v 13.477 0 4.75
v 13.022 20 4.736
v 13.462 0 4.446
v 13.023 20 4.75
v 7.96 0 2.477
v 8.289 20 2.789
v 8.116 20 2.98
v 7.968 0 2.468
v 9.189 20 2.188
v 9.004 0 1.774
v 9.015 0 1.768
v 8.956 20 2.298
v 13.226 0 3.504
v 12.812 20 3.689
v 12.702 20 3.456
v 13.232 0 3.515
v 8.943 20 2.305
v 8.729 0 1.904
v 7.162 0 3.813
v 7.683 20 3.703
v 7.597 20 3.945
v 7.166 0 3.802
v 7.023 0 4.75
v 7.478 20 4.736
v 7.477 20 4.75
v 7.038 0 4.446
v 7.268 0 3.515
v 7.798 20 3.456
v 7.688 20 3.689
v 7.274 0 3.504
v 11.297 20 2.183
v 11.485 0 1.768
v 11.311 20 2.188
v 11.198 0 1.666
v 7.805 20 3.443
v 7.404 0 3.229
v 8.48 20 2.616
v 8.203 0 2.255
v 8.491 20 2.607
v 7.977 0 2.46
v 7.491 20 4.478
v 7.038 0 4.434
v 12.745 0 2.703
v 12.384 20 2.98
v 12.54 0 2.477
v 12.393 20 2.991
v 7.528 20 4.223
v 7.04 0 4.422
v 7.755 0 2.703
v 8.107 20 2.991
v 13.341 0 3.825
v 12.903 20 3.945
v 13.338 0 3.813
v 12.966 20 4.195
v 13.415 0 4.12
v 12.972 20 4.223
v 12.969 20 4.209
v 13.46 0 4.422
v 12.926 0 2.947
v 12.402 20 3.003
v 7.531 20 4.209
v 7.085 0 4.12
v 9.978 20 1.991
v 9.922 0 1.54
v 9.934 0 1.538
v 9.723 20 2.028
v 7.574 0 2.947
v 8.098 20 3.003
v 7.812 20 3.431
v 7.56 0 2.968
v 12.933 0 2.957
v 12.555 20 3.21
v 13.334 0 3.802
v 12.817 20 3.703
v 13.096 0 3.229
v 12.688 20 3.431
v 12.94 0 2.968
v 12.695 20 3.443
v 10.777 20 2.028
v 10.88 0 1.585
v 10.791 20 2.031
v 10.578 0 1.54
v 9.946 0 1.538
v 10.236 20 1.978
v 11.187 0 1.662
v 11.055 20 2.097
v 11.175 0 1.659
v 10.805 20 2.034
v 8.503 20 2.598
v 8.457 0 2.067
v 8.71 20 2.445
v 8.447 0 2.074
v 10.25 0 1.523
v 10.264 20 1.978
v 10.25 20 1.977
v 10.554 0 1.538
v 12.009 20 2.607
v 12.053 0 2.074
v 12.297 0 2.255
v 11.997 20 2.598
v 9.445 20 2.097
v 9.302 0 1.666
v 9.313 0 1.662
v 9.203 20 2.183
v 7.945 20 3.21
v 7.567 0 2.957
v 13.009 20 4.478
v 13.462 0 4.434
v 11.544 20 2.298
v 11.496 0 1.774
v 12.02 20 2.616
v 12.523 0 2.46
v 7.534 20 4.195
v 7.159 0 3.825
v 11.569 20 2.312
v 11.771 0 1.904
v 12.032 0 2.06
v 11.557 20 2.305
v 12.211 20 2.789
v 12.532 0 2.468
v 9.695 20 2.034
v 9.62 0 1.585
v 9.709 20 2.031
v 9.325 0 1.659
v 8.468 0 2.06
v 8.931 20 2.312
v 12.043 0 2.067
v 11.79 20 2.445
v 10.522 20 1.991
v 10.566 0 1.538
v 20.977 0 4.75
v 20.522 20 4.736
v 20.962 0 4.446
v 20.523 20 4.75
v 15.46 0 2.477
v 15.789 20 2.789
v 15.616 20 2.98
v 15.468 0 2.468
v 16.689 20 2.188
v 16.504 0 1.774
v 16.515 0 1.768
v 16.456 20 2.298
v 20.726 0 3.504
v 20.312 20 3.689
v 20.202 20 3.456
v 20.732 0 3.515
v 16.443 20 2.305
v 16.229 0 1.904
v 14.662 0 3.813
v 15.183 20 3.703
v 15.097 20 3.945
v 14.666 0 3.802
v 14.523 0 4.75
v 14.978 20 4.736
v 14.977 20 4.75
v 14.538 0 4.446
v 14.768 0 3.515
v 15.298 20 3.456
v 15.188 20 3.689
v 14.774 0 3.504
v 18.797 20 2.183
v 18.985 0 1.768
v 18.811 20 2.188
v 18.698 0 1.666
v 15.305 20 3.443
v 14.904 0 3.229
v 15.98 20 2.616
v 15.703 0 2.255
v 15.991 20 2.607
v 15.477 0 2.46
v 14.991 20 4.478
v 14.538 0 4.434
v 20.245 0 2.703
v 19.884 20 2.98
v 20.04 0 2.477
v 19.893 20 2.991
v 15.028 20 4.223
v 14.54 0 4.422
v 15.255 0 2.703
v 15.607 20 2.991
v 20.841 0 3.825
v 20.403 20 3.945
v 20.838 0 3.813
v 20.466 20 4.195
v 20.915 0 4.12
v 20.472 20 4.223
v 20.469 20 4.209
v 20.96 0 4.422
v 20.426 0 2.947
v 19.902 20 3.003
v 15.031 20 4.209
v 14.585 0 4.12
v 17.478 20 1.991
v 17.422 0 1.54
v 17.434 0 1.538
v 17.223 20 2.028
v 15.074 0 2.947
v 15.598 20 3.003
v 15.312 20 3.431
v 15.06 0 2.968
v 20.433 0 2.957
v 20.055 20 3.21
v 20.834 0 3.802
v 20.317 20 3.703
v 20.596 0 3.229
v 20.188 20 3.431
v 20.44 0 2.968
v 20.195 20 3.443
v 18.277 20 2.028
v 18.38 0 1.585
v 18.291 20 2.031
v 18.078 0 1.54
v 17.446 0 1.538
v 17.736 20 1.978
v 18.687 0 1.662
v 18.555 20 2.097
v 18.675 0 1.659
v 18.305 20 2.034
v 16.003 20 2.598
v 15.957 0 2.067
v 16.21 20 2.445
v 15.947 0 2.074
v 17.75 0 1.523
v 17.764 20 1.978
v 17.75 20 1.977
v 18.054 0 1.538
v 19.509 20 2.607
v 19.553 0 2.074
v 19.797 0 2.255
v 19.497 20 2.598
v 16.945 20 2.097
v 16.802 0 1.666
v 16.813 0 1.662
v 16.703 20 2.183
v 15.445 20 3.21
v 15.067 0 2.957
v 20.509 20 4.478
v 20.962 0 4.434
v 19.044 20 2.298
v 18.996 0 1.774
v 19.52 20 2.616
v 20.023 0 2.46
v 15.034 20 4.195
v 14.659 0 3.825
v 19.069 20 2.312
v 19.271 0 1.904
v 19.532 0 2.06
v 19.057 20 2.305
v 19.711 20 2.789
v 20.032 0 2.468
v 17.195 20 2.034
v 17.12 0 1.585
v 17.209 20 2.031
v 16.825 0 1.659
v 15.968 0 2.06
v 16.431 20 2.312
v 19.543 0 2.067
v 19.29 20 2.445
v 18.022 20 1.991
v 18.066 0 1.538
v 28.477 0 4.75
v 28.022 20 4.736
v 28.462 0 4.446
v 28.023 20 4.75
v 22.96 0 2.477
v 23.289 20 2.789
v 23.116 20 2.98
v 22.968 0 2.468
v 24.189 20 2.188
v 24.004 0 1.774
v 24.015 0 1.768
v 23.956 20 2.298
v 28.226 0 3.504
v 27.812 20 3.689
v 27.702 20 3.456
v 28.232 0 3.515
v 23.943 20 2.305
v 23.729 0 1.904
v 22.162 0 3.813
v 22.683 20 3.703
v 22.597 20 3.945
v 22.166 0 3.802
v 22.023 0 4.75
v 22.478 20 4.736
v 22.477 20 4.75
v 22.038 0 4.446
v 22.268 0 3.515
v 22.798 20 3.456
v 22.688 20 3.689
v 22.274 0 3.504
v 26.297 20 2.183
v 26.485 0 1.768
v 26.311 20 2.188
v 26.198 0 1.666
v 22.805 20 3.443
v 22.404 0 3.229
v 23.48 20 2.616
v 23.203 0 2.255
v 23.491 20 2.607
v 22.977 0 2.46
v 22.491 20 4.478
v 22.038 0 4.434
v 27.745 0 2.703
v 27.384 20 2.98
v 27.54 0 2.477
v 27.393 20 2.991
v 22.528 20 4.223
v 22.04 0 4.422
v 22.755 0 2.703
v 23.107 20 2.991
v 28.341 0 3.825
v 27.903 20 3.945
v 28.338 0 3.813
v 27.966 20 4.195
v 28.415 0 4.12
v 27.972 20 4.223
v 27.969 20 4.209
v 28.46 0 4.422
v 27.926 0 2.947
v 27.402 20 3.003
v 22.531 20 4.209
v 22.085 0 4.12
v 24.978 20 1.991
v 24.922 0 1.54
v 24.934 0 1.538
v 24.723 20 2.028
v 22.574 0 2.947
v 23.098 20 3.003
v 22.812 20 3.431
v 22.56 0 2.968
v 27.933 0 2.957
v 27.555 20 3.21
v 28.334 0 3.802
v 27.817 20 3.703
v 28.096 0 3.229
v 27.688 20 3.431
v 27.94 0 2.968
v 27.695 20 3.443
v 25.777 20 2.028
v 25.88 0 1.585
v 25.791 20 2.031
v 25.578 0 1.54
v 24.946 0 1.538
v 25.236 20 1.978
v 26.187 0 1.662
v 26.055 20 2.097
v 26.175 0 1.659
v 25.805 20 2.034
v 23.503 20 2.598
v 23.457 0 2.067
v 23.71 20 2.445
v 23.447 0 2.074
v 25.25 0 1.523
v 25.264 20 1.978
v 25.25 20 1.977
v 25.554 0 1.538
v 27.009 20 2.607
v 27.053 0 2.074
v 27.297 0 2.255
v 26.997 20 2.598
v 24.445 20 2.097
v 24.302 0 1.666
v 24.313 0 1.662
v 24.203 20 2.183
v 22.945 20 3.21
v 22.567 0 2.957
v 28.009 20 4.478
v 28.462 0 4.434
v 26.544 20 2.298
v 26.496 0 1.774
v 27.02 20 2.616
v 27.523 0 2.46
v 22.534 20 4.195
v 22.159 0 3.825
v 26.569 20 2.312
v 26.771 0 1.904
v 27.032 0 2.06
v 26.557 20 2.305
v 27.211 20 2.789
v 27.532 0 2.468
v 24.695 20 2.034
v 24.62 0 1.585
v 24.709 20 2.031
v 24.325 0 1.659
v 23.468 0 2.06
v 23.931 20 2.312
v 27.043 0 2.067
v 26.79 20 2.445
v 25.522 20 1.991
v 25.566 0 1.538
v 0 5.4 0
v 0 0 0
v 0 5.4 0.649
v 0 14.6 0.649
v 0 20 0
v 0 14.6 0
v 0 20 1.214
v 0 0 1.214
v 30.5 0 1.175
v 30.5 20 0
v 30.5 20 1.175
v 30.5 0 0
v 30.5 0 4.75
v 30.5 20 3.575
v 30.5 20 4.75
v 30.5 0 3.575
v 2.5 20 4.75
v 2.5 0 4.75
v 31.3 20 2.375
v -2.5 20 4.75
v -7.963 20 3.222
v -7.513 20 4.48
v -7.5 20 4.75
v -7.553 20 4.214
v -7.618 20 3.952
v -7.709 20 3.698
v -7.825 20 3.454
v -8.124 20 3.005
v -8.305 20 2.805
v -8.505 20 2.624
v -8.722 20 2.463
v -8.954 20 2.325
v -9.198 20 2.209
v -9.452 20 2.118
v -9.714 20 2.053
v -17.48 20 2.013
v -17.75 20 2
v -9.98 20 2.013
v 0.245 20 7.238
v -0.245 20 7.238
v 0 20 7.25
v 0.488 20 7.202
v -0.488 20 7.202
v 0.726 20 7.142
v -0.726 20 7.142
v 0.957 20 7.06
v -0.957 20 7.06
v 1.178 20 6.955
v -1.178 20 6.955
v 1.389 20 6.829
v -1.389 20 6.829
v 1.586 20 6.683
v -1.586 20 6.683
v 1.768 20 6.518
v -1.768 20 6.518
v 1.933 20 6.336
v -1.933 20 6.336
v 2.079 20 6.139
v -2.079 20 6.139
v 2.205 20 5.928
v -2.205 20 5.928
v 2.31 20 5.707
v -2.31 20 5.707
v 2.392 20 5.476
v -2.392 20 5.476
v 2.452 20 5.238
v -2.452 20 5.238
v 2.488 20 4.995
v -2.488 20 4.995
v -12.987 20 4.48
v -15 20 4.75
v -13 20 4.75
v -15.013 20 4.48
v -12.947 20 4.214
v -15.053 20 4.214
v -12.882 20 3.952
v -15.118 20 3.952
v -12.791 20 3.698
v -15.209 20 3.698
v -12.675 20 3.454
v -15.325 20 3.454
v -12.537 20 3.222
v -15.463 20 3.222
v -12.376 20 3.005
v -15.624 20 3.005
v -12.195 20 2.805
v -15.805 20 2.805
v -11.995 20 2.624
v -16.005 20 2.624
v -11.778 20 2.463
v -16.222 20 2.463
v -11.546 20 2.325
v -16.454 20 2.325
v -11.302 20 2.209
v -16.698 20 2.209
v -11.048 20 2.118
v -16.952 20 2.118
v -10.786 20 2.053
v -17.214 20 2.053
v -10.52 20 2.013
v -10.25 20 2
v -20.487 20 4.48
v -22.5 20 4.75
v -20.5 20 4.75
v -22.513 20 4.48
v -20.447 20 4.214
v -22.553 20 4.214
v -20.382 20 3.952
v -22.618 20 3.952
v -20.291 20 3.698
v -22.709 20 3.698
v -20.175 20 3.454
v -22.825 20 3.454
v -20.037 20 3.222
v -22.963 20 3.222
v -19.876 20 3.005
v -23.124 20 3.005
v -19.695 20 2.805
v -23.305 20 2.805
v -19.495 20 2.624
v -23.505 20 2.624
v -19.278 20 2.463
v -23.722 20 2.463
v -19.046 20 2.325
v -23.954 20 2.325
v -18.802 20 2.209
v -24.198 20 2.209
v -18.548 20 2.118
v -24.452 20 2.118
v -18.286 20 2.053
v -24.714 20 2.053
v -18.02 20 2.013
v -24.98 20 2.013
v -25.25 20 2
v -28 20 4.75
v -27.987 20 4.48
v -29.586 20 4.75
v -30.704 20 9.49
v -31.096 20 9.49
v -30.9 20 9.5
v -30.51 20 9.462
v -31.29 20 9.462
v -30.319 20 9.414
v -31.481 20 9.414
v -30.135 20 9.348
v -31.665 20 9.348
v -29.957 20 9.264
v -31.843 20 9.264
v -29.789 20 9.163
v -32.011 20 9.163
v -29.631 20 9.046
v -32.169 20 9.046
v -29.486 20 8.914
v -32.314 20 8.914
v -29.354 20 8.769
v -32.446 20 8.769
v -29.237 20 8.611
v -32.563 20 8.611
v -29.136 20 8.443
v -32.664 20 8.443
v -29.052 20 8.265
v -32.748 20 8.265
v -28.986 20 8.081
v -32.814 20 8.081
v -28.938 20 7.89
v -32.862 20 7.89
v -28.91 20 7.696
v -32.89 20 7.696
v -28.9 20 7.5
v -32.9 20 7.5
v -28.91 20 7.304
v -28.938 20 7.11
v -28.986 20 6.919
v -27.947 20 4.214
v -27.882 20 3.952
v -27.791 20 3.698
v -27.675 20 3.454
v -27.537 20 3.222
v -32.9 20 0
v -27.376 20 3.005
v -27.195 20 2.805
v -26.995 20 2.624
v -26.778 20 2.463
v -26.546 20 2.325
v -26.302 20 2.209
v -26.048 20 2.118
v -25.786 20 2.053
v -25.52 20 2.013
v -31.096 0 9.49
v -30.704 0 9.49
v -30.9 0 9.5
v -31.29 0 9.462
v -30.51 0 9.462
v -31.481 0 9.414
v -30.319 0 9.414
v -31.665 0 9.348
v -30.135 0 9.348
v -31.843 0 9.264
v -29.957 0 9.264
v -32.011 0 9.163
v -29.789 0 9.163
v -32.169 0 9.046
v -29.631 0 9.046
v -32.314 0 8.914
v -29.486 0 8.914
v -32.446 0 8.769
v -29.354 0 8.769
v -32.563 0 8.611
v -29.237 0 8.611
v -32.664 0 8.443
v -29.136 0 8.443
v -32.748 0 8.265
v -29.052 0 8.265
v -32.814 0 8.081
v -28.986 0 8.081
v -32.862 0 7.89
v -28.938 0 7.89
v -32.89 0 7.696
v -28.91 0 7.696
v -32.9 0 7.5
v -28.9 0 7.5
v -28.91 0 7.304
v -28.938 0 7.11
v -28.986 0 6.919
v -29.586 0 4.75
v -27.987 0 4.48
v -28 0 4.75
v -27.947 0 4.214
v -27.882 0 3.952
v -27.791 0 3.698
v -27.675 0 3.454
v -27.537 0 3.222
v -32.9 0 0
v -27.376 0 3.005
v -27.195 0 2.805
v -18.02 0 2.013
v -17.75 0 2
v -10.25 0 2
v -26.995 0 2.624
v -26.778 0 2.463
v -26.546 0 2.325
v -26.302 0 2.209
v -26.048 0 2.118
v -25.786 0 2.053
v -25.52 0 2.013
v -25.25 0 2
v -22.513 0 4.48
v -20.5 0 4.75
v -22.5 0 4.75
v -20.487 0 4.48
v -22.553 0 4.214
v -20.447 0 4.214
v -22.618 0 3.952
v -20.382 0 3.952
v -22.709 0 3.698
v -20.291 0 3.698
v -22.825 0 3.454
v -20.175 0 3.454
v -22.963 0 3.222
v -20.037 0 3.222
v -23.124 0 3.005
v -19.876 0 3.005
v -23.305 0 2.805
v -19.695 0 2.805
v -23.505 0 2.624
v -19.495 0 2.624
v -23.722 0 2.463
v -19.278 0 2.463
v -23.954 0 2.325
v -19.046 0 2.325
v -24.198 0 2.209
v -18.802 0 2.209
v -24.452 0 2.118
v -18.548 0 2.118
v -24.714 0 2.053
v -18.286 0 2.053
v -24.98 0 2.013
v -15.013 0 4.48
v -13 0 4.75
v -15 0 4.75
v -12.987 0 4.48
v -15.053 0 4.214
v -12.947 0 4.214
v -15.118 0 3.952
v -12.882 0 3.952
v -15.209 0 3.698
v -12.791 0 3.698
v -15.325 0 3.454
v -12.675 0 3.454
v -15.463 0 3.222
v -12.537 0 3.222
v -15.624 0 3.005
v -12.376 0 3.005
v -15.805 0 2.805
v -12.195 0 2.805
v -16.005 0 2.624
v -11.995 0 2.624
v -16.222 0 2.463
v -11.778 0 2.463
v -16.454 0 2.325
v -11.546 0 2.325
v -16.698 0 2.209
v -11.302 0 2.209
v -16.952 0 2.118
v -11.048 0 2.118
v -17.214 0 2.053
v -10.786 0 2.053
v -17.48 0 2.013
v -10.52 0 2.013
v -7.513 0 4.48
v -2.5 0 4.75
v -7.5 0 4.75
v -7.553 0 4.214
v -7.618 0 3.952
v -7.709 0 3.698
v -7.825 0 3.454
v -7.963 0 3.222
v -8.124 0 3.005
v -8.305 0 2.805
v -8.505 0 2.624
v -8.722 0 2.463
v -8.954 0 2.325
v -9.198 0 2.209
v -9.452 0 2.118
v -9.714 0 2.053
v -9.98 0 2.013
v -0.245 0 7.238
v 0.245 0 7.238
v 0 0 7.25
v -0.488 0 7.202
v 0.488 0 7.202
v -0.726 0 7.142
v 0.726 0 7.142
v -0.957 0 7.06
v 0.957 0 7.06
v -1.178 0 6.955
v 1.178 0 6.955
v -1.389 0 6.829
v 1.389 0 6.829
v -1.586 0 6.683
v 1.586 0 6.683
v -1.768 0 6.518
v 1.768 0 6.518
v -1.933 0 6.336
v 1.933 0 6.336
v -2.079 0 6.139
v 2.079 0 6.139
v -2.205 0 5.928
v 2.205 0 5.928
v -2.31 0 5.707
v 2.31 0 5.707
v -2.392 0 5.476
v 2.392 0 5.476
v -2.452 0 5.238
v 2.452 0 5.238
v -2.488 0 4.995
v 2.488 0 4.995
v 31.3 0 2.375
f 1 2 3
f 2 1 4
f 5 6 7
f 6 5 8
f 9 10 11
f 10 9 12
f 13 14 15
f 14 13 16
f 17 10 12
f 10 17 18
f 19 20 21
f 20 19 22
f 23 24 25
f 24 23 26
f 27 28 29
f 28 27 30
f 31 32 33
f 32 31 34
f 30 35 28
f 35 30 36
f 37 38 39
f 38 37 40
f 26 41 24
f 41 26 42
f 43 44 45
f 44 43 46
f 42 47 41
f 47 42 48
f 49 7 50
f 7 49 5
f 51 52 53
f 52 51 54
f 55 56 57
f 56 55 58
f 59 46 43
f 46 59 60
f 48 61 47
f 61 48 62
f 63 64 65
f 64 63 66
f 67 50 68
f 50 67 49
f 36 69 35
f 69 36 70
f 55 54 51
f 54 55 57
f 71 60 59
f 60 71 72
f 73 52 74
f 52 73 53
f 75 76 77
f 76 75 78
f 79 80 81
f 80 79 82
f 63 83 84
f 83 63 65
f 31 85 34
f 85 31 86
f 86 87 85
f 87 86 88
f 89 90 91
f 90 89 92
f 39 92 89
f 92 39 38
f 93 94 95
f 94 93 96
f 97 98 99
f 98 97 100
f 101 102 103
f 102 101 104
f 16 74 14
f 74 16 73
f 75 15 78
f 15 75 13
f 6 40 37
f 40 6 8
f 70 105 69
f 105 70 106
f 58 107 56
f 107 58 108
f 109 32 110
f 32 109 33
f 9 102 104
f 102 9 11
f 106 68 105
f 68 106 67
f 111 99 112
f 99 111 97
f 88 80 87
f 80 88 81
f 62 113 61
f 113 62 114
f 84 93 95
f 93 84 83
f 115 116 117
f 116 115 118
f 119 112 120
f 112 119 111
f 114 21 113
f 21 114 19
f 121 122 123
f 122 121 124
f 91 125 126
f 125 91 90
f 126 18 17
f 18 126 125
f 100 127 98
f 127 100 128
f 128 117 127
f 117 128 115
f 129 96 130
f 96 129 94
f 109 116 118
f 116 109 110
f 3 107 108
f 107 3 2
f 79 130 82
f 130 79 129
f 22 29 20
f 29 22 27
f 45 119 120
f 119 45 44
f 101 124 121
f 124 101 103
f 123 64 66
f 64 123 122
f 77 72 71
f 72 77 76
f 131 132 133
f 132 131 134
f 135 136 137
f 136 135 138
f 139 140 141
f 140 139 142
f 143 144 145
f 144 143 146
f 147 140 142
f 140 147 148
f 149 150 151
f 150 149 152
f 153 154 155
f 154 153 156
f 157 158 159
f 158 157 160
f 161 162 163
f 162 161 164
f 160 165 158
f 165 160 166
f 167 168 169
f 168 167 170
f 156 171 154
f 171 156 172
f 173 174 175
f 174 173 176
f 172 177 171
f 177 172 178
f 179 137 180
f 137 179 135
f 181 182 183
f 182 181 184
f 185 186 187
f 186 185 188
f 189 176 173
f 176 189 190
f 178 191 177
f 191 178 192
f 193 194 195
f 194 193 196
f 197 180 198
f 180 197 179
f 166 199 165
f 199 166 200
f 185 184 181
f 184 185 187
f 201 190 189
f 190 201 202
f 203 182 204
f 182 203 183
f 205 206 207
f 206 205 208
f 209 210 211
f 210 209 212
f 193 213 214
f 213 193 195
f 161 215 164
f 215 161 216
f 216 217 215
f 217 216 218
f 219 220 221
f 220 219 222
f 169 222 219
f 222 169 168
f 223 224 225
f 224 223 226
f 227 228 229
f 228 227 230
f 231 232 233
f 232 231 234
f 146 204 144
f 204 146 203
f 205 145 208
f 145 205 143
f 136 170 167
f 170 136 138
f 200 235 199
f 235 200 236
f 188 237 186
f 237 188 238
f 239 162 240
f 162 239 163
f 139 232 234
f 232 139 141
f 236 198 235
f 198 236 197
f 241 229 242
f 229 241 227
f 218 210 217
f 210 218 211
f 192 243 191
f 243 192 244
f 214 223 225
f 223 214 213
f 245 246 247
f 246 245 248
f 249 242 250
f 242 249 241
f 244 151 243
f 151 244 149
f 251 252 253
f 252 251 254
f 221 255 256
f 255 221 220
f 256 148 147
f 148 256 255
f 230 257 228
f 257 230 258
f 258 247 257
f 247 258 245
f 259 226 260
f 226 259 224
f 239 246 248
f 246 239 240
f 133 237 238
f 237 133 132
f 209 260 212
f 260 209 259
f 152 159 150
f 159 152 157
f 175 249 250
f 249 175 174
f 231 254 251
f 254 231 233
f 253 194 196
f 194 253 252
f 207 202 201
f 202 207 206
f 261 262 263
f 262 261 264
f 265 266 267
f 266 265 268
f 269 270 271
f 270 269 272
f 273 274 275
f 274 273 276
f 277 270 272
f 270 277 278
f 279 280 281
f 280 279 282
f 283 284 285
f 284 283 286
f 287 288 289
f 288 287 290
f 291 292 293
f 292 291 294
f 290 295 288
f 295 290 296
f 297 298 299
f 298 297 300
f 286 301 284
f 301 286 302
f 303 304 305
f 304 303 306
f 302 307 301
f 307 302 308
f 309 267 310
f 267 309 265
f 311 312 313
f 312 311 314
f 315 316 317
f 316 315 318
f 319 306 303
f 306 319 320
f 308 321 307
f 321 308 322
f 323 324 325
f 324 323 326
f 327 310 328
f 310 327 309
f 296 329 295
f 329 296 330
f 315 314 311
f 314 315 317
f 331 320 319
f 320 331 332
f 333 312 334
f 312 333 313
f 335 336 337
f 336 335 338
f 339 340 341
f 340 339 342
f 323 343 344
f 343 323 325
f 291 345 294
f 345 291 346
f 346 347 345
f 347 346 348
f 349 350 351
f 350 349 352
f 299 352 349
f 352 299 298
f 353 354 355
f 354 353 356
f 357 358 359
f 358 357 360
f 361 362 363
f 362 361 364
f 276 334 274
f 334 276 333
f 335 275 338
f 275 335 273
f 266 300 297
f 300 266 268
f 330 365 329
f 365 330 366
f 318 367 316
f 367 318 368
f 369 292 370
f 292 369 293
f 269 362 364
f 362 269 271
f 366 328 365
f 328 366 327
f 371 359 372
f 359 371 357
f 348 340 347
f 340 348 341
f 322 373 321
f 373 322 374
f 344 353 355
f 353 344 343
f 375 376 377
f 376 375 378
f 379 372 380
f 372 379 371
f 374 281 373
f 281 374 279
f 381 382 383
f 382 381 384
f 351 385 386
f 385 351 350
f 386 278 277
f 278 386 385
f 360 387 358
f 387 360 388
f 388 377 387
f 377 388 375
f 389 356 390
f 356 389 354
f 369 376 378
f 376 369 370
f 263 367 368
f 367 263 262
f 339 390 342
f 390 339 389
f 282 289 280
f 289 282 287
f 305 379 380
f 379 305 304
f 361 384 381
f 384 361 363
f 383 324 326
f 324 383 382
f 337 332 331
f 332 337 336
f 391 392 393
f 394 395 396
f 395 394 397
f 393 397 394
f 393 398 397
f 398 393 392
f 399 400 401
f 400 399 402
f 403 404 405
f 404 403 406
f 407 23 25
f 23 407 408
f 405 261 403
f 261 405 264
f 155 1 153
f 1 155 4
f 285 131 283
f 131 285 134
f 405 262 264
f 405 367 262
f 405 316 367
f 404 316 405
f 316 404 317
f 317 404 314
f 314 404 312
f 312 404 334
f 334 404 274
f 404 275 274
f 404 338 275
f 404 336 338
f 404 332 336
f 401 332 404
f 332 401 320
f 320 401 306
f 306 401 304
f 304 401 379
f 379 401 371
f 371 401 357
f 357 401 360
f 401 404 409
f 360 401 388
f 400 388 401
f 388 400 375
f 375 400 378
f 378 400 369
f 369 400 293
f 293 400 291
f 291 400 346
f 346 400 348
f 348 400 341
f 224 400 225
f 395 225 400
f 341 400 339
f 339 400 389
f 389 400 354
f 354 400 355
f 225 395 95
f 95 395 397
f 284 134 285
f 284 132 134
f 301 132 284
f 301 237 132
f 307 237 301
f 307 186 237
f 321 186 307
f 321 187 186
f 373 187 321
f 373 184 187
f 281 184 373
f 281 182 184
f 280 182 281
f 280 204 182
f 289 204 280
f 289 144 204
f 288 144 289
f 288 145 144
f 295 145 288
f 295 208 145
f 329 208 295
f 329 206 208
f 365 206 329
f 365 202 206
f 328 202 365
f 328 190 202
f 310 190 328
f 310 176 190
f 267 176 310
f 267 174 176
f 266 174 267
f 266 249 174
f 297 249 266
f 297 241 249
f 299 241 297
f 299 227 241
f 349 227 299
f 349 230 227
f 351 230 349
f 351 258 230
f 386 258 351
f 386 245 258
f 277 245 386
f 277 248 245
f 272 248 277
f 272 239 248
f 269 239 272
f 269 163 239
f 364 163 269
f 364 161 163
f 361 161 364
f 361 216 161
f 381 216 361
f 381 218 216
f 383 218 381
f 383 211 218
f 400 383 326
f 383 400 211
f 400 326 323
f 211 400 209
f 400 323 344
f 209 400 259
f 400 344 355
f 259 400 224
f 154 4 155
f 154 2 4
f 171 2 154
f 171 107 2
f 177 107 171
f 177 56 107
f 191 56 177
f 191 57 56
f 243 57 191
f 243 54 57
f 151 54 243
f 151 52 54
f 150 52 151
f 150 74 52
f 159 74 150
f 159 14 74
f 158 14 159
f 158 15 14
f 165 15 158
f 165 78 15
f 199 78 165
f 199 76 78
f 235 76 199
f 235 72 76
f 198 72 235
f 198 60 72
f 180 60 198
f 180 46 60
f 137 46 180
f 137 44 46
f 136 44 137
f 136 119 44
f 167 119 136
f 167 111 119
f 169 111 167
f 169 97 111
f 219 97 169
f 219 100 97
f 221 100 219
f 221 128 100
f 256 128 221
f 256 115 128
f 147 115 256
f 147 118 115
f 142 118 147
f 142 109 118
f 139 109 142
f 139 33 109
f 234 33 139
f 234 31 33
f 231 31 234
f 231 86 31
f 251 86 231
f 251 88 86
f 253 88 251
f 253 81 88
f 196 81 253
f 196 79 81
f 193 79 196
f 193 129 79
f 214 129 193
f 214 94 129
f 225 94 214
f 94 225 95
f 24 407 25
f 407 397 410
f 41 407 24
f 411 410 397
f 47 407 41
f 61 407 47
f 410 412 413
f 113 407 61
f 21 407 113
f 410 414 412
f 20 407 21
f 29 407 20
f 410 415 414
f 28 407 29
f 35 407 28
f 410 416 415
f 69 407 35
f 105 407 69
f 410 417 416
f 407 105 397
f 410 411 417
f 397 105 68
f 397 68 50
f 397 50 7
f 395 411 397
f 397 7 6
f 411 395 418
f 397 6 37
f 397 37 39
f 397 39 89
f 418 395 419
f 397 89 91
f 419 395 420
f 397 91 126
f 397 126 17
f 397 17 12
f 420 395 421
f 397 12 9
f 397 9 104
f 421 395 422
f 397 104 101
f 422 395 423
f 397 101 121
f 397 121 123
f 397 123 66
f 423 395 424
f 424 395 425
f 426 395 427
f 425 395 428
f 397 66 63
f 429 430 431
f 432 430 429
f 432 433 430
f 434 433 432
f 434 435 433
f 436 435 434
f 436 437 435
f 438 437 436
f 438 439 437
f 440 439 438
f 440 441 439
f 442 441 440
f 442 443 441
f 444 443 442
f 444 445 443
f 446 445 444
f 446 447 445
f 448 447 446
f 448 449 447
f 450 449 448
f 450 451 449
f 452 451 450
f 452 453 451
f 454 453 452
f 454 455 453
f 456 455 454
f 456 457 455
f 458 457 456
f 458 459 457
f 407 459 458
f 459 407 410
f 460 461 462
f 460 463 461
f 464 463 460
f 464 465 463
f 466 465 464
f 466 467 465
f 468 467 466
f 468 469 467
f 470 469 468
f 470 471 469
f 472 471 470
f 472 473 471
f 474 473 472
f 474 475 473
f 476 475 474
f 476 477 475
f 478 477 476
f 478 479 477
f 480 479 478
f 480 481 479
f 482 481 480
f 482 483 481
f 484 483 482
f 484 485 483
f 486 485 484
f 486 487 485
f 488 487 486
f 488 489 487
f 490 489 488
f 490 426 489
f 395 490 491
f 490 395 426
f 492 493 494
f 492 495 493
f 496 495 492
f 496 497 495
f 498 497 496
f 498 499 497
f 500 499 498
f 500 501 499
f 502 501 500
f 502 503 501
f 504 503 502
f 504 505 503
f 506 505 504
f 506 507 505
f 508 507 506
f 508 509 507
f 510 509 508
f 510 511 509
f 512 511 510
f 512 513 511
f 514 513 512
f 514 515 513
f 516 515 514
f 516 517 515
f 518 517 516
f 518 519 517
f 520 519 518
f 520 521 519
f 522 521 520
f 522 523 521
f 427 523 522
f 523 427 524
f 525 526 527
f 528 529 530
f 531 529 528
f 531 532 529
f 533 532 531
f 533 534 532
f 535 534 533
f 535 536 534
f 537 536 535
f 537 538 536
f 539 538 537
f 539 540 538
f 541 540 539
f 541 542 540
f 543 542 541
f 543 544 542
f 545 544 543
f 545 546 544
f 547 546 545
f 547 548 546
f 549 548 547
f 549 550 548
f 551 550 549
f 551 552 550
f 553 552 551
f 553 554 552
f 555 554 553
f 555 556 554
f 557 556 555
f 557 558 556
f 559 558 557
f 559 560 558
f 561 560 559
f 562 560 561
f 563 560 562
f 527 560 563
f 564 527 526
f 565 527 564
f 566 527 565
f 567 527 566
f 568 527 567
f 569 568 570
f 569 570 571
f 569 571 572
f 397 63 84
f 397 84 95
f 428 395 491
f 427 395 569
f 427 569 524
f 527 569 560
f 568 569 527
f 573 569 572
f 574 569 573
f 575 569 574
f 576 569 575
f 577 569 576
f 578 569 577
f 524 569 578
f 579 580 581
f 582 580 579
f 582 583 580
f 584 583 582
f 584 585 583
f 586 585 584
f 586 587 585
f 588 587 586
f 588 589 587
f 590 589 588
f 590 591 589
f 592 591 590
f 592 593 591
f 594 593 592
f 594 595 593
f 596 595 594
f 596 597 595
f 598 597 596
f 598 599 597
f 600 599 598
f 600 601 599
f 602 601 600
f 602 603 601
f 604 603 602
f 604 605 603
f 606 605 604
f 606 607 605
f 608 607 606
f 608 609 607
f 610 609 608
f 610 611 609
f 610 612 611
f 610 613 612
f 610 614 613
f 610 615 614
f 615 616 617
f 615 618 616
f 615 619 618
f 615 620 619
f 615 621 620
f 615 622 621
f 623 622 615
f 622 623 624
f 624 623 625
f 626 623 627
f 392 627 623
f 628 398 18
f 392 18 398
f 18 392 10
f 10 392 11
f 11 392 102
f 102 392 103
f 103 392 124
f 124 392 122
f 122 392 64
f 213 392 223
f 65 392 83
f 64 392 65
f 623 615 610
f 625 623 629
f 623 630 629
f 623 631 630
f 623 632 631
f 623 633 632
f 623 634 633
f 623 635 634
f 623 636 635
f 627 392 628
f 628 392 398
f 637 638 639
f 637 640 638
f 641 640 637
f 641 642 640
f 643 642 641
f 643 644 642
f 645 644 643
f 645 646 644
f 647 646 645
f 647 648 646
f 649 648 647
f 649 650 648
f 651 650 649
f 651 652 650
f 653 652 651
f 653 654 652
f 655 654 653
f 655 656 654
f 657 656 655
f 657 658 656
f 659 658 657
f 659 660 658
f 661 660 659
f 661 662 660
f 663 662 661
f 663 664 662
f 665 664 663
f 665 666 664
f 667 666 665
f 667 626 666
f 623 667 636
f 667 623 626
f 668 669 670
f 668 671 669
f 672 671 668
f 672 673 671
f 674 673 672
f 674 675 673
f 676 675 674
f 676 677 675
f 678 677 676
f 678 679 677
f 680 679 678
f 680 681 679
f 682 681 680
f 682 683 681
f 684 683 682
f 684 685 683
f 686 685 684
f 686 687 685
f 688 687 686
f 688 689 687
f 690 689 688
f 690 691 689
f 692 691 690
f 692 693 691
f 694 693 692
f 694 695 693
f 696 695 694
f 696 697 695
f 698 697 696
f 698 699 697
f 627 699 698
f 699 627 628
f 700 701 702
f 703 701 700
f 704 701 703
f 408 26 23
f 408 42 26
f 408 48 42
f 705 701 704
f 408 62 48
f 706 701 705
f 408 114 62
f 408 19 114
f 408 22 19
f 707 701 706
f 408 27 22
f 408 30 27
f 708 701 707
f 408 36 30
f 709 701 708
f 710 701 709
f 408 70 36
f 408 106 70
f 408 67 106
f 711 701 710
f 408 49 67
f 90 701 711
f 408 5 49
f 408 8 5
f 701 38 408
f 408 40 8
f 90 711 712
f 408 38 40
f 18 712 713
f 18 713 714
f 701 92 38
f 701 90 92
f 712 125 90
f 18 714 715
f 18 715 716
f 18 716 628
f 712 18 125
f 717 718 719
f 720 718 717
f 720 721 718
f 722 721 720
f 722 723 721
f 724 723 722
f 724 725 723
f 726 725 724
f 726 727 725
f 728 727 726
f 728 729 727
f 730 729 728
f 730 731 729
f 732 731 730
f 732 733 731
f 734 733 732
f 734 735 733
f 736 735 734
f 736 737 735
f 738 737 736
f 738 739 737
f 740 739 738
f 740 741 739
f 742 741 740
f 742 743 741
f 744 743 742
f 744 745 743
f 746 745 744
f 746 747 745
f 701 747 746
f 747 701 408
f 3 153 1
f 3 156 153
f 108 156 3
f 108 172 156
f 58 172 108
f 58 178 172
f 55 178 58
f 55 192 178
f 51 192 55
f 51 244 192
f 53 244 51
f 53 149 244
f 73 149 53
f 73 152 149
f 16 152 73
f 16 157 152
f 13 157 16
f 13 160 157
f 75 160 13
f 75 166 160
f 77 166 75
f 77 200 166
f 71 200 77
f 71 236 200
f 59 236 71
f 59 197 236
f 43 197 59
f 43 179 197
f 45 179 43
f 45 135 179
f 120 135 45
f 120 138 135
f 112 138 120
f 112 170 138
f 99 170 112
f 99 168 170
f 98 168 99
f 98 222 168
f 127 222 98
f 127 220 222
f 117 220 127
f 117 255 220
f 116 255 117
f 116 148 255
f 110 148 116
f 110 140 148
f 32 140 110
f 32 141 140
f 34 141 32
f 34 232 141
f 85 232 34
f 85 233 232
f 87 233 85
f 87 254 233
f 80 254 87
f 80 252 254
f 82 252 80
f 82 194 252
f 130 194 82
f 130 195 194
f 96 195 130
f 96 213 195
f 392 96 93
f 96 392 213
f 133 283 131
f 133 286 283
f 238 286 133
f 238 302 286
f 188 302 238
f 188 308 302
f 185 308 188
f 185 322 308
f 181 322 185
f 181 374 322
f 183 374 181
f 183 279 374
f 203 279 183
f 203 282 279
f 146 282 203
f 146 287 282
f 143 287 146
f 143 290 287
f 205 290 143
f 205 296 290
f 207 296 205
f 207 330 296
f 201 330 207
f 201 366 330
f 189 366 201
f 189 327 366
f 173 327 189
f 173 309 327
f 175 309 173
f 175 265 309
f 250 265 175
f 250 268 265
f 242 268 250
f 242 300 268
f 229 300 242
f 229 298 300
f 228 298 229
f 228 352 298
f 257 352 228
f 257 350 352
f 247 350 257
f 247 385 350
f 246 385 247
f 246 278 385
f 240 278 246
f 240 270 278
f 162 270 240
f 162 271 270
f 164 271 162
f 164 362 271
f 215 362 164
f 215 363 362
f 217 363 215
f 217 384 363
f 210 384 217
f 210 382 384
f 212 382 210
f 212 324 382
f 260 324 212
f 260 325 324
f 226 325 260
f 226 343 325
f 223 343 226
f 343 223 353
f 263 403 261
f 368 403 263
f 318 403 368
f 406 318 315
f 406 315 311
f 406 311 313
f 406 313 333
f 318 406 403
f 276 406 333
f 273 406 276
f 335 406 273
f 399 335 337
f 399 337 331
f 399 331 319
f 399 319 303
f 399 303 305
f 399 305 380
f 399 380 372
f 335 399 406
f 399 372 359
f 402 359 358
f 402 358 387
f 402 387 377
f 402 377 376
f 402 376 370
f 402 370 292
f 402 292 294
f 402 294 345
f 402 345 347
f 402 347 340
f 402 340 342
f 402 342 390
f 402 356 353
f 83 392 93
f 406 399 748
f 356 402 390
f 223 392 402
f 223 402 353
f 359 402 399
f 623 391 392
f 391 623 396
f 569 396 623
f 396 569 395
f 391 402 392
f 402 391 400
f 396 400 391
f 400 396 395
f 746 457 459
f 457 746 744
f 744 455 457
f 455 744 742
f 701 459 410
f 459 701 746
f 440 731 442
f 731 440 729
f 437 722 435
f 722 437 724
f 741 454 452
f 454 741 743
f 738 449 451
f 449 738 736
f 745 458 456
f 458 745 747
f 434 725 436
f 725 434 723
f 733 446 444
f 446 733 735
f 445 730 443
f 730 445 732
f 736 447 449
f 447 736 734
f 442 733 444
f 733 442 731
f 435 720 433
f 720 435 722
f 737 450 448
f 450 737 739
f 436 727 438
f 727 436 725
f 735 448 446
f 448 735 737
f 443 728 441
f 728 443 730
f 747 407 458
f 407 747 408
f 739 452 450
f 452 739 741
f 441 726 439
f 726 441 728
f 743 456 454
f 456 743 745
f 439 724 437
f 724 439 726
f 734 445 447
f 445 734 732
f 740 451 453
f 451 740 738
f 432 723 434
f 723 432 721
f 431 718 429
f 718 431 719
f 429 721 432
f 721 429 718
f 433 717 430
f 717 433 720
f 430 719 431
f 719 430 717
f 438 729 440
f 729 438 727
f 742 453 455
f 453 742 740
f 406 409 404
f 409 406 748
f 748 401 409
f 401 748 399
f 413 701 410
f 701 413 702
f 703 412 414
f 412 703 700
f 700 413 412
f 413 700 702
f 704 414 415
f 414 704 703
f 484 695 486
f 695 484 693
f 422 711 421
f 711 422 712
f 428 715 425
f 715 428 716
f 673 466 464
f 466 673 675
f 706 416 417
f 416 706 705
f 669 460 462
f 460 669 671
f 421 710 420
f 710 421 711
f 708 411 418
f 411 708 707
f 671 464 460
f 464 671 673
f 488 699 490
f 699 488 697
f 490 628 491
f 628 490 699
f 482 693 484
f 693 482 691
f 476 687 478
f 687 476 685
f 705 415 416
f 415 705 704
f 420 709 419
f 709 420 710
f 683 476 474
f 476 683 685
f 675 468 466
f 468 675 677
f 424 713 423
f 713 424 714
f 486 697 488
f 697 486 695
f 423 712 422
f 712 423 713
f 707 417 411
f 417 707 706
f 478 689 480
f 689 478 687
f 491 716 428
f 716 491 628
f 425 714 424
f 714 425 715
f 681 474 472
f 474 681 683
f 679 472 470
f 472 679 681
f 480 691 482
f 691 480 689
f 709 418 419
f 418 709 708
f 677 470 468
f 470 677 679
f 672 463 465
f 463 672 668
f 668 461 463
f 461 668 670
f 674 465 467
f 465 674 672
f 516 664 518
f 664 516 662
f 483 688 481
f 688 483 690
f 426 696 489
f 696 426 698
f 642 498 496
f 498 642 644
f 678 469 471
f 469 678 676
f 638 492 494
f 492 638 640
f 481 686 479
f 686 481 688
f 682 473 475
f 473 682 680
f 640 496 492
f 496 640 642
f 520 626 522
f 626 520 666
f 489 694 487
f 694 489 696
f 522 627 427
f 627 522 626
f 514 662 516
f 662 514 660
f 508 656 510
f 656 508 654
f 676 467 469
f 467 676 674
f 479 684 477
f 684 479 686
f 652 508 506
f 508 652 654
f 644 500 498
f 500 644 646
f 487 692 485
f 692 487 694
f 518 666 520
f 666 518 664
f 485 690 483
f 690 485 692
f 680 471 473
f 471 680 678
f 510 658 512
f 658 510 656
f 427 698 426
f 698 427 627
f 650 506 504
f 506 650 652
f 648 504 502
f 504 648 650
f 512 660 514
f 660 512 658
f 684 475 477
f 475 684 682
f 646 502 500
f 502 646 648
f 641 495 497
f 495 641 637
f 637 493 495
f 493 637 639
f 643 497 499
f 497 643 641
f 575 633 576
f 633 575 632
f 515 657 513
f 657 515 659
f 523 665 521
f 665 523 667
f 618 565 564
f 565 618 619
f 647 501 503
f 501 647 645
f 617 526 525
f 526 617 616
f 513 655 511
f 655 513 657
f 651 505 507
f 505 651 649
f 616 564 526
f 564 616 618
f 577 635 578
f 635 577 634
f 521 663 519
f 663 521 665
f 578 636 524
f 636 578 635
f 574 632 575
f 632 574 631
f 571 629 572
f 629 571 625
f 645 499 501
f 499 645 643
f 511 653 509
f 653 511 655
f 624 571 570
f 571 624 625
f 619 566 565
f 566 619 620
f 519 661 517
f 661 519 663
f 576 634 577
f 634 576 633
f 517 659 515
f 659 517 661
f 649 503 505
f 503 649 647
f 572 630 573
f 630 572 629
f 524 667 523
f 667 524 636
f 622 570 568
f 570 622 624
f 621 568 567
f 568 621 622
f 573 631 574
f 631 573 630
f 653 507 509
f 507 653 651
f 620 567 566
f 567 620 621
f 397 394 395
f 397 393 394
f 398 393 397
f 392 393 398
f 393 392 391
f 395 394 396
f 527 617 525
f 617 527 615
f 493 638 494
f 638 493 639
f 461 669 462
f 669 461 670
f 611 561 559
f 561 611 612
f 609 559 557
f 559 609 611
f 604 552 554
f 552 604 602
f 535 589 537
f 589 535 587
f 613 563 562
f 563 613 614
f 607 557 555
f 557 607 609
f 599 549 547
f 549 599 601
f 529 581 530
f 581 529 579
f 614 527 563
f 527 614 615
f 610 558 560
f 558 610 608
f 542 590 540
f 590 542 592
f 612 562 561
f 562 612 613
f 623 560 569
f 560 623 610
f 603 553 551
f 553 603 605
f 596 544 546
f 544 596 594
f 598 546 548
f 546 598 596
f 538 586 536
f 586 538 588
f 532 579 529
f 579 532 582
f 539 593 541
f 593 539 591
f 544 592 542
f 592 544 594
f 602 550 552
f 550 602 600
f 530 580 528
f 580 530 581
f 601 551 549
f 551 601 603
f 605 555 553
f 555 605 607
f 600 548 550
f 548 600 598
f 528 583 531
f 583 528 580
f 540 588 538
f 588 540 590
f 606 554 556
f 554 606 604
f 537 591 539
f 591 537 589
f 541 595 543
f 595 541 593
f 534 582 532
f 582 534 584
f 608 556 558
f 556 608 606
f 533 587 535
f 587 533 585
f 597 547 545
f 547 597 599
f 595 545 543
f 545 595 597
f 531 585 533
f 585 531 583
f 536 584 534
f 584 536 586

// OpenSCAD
// ============================================================
//   CLIP FERMA CAVO PRINT-IN-PLACE
//   Design parametrico con cerniera e chiusura a scatto
// ============================================================

/* [Clip Ferma Cavo] */
// Numero di cavi da gestire
num_cables = 3; // [1:1:10]
// Diametro dei cavi in mm (5.5 è ottimo per USB-C)
cable_dia = 5.5; // [3:0.1:15]
// Lunghezza della clip lungo il cavo
clip_length = 20; // [10:1:50]

/* [Tolleranze e Stampa] */
// Tolleranza per la cerniera print-in-place (0.4 consigliata per PLA)
pip_clearance = 0.4; // [0.1:0.1:0.8]
// Durezza dello scatto (maggiore = più forte ma richiede più flessione)
snap_depth = 0.8; // [0.4:0.1:1.5]

/* [Avanzate] */
// Risoluzione curve
$fn = 64; 
// Spessore delle pareti solide
wall = 2.5; 
// Raggio della cerniera
hinge_r = 2.5; 

// Calcoli geometrici
base_h = 2.0 + cable_dia / 2;
cable_pitch = cable_dia + 2.0;
first_cable_x = hinge_r * 2 + wall + cable_dia / 2;
Base_end_X = first_cable_x + (num_cables - 1) * cable_pitch + cable_dia / 2 + wall;
Top_body_w = Base_end_X + pip_clearance;
Top_arm_X = -Top_body_w;
arm_thick = 2.0;

// ============================================================
// MODULI DI BASE
// ============================================================

module teardrop_pin(r, l) {
    // Perno a forma di goccia per stampabilità senza supporti
    rotate([-90, 0, 0])
    linear_extrude(height=l)
    hull() {
        circle(r=r);
        polygon([[-r*sin(45), r*cos(45)], [r*sin(45), r*cos(45)], [0, r / sin(45)]]);
    }
}

// ============================================================
// PARTI PRINCIPALI
// ============================================================

module base_part() {
    k_length = min(5, clip_length / 4);
    
    union() {
        // Nocche della cerniera (Knuckles) - Base ne ha 2 esterne
        translate([0, 0, 0]) 
            cube([hinge_r*2, k_length, base_h]);
        translate([0, clip_length - k_length, 0]) 
            cube([hinge_r*2, k_length, base_h]);
        
        // Perno centrale (Pin)
        translate([0, 0, base_h]) 
            teardrop_pin(hinge_r, clip_length);
            
        // Corpo Principale Base
        difference() {
            // Blocco base arrotondato sul fondo
            hull() {
                translate([0, 0, 0]) cube([Base_end_X, clip_length, base_h - 1]);
                translate([0, 0, base_h - 1]) cube([Base_end_X, clip_length, 1]);
            }
            
            // Scanalature per i cavi
            for(i=[0:num_cables-1]) {
                translate([first_cable_x + i*cable_pitch, -1, base_h])
                    rotate([-90, 0, 0])
                        cylinder(h=clip_length + 2, r=cable_dia/2);
                
                // Leggero invito per l'inserimento
                translate([first_cable_x + i*cable_pitch, -1, base_h])
                    rotate([-90, 0, 0])
                        cylinder(h=clip_length + 2, r1=cable_dia/2 + 0.5, r2=cable_dia/2);
            }
        }
        
        // Dente a scatto (Snap Ridge)
        translate([Base_end_X, 0, base_h / 2])
            rotate([-90, 0, 0])
                linear_extrude(height=clip_length)
                    polygon([[0, -1.2], [snap_depth, 0], [0, 1.2]]);
    }
}

module top_part() {
    k_length = min(5, clip_length / 4);
    
    union() {
        // Nocca centrale
        difference() {
            translate([-hinge_r*2, k_length + pip_clearance, 0])
                cube([hinge_r*2, clip_length - 2*k_length - 2*pip_clearance, base_h]);
                
            // Foro per il perno (con tolleranza)
            translate([0, -1, base_h]) 
                teardrop_pin(hinge_r + pip_clearance, clip_length + 2);
        }
        
        // Corpo Principale Top
        translate([-Top_body_w, 0, 0])
            difference() {
                cube([Top_body_w, clip_length, base_h]);
                
                // Scanalature per i cavi (speculari)
                for(i=[0:num_cables-1]) {
                    translate([Top_body_w - (first_cable_x + i*cable_pitch), -1, base_h])
                        rotate([-90, 0, 0])
                            cylinder(h=clip_length + 2, r=cable_dia/2);
                }
            }
            
        // Braccio Flessibile a Scatto (Snap Arm)
        translate([Top_arm_X - arm_thick, 0, 0])
            hull() {
                cube([arm_thick, clip_length, base_h * 2 - 2]);
                // Arrotondamento superiore
                translate([arm_thick, 0, base_h * 2 - 2])
                    rotate([-90, 0, 0])
                        cylinder(h=clip_length, r=2);
            }
            
        // Gancio dello Scatto (Snap Hook)
        translate([Top_arm_X, 0, base_h * 1.5])
            rotate([-90, 0, 0])
                linear_extrude(height=clip_length)
                    polygon([[0, -1.2], [snap_depth, 0], [0, 1.2]]);
    }
}

// ============================================================
// ASSEMBLAGGIO FINALE
// ============================================================

// Stampa in piano: La parte base e la parte superiore vengono stampate affiancate.
// Nessun supporto è necessario. Dopo la stampa, piega la parte superiore di 180 gradi.

base_part();
top_part();
